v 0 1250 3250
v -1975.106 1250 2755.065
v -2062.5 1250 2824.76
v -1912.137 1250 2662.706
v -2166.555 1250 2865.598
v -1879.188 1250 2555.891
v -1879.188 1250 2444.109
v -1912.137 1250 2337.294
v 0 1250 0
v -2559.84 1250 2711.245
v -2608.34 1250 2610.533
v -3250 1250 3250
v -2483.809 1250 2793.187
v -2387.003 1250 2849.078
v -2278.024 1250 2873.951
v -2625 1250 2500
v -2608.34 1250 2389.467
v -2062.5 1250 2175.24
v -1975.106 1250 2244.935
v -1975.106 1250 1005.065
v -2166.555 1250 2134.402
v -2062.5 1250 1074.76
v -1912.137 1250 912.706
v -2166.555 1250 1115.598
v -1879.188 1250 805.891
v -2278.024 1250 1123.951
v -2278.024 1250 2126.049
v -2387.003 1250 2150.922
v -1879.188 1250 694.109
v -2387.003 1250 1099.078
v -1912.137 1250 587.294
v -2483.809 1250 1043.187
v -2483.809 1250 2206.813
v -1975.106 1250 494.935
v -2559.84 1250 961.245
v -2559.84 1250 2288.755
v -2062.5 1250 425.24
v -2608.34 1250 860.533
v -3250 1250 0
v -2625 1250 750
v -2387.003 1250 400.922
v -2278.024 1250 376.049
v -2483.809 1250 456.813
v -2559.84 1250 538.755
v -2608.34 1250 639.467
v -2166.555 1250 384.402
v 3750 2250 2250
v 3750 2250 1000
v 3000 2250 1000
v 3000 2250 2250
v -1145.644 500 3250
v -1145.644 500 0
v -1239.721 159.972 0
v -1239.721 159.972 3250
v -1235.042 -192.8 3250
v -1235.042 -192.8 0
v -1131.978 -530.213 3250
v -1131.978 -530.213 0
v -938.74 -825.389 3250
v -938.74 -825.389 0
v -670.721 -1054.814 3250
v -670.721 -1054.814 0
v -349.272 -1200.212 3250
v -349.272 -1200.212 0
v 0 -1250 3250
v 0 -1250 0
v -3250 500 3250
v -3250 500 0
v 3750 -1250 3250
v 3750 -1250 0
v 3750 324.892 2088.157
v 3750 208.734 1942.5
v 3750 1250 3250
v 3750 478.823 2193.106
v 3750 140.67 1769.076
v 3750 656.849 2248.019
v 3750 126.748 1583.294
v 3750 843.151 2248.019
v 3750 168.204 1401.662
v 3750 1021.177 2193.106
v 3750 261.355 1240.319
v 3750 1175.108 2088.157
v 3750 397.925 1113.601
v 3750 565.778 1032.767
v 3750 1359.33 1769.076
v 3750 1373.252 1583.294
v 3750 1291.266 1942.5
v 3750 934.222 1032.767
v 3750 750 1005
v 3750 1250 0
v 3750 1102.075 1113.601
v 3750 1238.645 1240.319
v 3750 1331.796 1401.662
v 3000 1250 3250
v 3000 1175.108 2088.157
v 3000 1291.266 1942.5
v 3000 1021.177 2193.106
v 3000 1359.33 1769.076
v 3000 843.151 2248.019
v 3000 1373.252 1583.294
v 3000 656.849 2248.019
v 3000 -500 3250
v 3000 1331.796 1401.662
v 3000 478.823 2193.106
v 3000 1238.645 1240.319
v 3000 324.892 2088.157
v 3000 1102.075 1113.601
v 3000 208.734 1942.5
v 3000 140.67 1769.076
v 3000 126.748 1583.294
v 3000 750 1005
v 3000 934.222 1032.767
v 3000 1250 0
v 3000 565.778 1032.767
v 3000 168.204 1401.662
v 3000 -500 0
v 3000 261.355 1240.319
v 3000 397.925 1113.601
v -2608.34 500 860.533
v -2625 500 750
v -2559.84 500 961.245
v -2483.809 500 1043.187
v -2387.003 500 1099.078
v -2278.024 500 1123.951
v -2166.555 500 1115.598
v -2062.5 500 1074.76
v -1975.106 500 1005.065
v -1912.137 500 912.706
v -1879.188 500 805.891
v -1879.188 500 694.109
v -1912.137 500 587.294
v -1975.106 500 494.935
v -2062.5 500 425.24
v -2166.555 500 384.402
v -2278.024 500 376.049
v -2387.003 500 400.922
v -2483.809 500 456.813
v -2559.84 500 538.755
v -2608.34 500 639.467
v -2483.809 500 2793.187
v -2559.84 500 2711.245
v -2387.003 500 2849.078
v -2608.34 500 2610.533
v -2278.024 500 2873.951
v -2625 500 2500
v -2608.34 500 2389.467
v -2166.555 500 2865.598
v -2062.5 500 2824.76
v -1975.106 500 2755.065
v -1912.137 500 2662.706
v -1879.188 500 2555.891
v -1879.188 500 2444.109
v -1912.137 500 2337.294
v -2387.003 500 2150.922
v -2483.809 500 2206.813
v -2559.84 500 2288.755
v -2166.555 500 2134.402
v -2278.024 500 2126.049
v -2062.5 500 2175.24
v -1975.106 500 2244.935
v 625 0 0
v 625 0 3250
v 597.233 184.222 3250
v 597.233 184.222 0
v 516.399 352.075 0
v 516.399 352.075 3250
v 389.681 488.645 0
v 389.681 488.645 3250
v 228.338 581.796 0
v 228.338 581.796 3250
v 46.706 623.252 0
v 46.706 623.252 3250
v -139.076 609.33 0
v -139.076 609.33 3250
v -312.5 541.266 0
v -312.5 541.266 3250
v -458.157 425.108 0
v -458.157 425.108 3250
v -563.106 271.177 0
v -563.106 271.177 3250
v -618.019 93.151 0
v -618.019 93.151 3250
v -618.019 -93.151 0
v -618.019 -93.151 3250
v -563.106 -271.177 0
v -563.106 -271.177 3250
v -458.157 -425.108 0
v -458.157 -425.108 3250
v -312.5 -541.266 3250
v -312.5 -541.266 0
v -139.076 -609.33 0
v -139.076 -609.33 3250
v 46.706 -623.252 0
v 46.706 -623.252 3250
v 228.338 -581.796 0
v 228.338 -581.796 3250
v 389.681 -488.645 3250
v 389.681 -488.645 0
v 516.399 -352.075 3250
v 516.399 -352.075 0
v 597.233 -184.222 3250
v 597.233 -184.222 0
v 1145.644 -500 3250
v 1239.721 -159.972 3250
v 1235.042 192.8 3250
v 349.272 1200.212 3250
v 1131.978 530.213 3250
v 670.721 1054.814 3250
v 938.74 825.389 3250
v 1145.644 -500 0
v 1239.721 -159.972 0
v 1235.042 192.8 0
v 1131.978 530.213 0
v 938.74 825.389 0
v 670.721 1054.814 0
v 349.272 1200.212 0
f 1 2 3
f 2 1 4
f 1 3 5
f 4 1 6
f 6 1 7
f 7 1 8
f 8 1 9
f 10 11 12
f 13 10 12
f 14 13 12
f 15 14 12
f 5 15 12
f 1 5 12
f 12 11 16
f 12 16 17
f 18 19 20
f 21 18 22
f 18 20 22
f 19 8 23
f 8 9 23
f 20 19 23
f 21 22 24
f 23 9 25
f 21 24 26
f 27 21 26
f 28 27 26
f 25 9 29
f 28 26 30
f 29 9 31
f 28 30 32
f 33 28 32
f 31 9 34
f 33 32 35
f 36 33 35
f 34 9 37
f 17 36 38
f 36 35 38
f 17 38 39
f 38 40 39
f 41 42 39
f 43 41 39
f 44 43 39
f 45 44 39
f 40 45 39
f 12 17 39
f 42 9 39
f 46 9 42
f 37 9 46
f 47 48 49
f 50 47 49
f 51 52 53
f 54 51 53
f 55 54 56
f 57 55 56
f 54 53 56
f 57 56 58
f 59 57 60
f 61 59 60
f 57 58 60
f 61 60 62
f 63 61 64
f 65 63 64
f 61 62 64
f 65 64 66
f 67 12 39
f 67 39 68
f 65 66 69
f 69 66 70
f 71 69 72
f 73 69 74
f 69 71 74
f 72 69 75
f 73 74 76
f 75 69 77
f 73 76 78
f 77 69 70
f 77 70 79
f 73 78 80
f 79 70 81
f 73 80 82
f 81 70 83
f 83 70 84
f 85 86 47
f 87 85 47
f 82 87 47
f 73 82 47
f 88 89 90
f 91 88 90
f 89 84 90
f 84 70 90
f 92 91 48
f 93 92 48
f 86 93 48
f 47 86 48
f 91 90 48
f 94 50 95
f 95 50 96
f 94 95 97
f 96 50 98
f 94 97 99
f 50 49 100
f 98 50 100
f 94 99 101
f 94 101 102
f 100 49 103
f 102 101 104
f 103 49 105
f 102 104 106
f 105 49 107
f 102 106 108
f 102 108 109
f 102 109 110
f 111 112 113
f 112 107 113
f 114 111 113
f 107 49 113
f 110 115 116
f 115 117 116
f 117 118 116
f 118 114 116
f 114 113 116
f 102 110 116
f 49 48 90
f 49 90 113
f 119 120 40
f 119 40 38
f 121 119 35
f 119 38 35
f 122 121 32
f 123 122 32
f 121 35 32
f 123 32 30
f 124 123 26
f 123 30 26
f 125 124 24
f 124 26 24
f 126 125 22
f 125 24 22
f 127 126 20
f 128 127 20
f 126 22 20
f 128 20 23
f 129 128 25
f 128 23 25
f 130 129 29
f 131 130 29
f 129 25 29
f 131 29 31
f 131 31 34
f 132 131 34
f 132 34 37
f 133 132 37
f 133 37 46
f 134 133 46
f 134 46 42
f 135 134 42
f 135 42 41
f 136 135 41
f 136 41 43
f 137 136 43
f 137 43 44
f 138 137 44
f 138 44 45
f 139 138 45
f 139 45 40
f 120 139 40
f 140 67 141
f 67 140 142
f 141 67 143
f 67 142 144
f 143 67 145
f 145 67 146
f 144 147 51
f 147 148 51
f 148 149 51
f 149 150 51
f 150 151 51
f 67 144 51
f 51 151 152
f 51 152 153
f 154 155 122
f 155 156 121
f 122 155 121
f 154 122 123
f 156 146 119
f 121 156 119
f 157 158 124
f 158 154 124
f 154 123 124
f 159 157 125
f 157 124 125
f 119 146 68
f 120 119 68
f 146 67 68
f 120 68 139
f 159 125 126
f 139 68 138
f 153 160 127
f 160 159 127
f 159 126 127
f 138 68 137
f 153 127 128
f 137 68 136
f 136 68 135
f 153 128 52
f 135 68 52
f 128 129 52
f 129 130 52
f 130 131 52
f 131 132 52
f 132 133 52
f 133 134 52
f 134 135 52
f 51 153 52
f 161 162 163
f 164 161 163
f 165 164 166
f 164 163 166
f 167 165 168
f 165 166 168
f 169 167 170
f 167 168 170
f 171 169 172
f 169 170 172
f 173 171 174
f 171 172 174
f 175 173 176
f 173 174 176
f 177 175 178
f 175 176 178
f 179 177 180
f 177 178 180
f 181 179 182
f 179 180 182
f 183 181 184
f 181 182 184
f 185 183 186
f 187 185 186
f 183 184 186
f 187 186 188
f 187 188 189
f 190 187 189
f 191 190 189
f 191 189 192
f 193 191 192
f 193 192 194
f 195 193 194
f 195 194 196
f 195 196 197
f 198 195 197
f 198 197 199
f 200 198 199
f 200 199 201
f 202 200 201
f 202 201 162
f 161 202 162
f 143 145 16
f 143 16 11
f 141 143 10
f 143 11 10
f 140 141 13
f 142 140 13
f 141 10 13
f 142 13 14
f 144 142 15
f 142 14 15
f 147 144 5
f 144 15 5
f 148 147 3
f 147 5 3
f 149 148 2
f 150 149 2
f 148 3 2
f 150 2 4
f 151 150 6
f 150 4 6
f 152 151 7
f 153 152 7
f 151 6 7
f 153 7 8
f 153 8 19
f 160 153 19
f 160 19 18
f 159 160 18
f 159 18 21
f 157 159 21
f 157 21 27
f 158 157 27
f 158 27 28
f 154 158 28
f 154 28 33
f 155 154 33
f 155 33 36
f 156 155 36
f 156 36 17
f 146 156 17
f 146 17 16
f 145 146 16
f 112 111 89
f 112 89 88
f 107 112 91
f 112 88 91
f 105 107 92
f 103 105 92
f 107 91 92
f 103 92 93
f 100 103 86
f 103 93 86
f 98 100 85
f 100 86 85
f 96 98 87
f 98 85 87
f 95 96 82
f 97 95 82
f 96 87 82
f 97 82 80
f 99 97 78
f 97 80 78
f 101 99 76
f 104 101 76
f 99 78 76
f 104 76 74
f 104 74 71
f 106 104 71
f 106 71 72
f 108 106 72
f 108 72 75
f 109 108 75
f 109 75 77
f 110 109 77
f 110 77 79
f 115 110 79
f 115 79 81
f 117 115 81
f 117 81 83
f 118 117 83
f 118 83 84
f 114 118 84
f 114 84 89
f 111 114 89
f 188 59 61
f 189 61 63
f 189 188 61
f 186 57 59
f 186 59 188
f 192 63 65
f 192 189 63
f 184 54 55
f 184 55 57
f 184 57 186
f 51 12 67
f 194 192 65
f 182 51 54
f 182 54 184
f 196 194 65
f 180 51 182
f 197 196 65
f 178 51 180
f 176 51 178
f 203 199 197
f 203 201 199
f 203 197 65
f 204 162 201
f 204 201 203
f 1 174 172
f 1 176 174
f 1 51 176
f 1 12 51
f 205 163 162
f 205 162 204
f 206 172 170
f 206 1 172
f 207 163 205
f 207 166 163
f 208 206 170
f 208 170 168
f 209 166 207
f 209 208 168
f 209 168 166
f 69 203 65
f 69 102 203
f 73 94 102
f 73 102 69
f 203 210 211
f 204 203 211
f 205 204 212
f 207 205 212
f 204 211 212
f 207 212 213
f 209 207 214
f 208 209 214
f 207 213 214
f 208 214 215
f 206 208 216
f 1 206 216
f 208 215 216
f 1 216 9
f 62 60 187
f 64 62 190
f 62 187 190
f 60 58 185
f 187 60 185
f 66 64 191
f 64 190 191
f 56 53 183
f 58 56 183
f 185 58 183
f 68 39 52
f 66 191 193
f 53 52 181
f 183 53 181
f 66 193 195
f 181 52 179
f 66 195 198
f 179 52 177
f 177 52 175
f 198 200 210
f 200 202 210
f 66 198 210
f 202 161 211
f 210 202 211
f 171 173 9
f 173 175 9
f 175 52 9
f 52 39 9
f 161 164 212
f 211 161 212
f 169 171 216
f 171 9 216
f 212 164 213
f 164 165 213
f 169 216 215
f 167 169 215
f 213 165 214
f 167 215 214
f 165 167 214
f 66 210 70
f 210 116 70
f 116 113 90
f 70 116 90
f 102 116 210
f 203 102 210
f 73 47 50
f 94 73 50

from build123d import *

# Parameters (mm, degrees)
BOSS_EXTRUDE1_DEPTH = 3250
SKETCH2_R           = 625
CUT_EXTRUDE1_DEPTH  = 5449.623679426
CUT_EXTRUDE2_REACH  = 5558.528
SKETCH3_R           = 375
CUT_EXTRUDE3_REACH  = 8040.968
SKETCH4_R           = 625
CHAMFER1_SIZE       = 1000


with BuildPart() as part:
    # Sketch1 → Boss-Extrude1 (new body)
    with BuildSketch(Plane.XY):
        with BuildLine():
            Line((0, 1250), (-3250, 1250))
            Line((-3250, 1250), (-3250, 500))
            Line((-3250, 500), (-1145.643923739, 500))
            ThreePointArc((-1145.643923739, 500), (-1045.825033168, -684.653196881), (0, -1250))
            Line((0, -1250), (3750, -1250))
            Line((3750, -1250), (3750, 2250))
            Line((3750, 2250), (3000, 2250))
            Line((3000, 2250), (3000, -500))
            Line((3000, -500), (1145.643923739, -500))
            ThreePointArc((1145.643923739, -500), (1045.825033168, 684.653196881), (0, 1250))
        make_face()
    extrude(amount=BOSS_EXTRUDE1_DEPTH)

    # Sketch2 → Cut-Extrude1 (cut, through all)
    with BuildSketch(Plane.XY.offset(3250)):
        Circle(SKETCH2_R)
    extrude(amount=-CUT_EXTRUDE1_DEPTH, mode=Mode.SUBTRACT)

    # Sketch3 → Cut-Extrude2 (cut, up to next)
    with BuildSketch(Plane(origin=(0, 1250, 0), x_dir=(1, 0, 0), z_dir=(0, 1, 0)), mode=Mode.PRIVATE) as cut_extrude2_sk1:
        with Locations(Location((-2250, -2500, 0), (0, 0, 180))):
            Circle(SKETCH3_R)
    cut_extrude2_tool1 = extrude(cut_extrude2_sk1.sketch, amount=-CUT_EXTRUDE2_REACH, mode=Mode.PRIVATE) & part.part
    # Sketch3 → Cut-Extrude2 (cut, up to next)
    with BuildSketch(Plane(origin=(0, 1250, 0), x_dir=(1, 0, 0), z_dir=(0, 1, 0)), mode=Mode.PRIVATE) as cut_extrude2_sk2:
        with Locations(Location((-2250, -750, 0), (0, 0, 180))):
            Circle(SKETCH3_R)
    cut_extrude2_tool2 = extrude(cut_extrude2_sk2.sketch, amount=-CUT_EXTRUDE2_REACH, mode=Mode.PRIVATE) & part.part
    add(cut_extrude2_tool1.solids().sort_by_distance((-2250, 1250, 2500))[0], mode=Mode.SUBTRACT)
    add(cut_extrude2_tool2.solids().sort_by_distance((-2250, 1250, 750))[0], mode=Mode.SUBTRACT)

    # Sketch4 → Cut-Extrude3 (cut, up to next)
    with BuildSketch(Plane(origin=(3750, 0, 0), x_dir=(0, 0, -1), z_dir=(1, 0, 0)), mode=Mode.PRIVATE) as cut_extrude3_sk1:
        with Locations((-1630, 750)):
            Circle(SKETCH4_R)
    cut_extrude3_tool1 = extrude(cut_extrude3_sk1.sketch, amount=-CUT_EXTRUDE3_REACH, mode=Mode.PRIVATE) & part.part
    add(cut_extrude3_tool1.solids().sort_by_distance((3750, 750, 1630))[0], mode=Mode.SUBTRACT)

    # Chamfer1
    chamfer1_edges = [part.edges().sort_by_distance(p)[0] for p in [
        (3375, 2250, 0),
        (3375, 2250, 3250),
    ]]
    chamfer(chamfer1_edges, length=CHAMFER1_SIZE)


solid = part.part
